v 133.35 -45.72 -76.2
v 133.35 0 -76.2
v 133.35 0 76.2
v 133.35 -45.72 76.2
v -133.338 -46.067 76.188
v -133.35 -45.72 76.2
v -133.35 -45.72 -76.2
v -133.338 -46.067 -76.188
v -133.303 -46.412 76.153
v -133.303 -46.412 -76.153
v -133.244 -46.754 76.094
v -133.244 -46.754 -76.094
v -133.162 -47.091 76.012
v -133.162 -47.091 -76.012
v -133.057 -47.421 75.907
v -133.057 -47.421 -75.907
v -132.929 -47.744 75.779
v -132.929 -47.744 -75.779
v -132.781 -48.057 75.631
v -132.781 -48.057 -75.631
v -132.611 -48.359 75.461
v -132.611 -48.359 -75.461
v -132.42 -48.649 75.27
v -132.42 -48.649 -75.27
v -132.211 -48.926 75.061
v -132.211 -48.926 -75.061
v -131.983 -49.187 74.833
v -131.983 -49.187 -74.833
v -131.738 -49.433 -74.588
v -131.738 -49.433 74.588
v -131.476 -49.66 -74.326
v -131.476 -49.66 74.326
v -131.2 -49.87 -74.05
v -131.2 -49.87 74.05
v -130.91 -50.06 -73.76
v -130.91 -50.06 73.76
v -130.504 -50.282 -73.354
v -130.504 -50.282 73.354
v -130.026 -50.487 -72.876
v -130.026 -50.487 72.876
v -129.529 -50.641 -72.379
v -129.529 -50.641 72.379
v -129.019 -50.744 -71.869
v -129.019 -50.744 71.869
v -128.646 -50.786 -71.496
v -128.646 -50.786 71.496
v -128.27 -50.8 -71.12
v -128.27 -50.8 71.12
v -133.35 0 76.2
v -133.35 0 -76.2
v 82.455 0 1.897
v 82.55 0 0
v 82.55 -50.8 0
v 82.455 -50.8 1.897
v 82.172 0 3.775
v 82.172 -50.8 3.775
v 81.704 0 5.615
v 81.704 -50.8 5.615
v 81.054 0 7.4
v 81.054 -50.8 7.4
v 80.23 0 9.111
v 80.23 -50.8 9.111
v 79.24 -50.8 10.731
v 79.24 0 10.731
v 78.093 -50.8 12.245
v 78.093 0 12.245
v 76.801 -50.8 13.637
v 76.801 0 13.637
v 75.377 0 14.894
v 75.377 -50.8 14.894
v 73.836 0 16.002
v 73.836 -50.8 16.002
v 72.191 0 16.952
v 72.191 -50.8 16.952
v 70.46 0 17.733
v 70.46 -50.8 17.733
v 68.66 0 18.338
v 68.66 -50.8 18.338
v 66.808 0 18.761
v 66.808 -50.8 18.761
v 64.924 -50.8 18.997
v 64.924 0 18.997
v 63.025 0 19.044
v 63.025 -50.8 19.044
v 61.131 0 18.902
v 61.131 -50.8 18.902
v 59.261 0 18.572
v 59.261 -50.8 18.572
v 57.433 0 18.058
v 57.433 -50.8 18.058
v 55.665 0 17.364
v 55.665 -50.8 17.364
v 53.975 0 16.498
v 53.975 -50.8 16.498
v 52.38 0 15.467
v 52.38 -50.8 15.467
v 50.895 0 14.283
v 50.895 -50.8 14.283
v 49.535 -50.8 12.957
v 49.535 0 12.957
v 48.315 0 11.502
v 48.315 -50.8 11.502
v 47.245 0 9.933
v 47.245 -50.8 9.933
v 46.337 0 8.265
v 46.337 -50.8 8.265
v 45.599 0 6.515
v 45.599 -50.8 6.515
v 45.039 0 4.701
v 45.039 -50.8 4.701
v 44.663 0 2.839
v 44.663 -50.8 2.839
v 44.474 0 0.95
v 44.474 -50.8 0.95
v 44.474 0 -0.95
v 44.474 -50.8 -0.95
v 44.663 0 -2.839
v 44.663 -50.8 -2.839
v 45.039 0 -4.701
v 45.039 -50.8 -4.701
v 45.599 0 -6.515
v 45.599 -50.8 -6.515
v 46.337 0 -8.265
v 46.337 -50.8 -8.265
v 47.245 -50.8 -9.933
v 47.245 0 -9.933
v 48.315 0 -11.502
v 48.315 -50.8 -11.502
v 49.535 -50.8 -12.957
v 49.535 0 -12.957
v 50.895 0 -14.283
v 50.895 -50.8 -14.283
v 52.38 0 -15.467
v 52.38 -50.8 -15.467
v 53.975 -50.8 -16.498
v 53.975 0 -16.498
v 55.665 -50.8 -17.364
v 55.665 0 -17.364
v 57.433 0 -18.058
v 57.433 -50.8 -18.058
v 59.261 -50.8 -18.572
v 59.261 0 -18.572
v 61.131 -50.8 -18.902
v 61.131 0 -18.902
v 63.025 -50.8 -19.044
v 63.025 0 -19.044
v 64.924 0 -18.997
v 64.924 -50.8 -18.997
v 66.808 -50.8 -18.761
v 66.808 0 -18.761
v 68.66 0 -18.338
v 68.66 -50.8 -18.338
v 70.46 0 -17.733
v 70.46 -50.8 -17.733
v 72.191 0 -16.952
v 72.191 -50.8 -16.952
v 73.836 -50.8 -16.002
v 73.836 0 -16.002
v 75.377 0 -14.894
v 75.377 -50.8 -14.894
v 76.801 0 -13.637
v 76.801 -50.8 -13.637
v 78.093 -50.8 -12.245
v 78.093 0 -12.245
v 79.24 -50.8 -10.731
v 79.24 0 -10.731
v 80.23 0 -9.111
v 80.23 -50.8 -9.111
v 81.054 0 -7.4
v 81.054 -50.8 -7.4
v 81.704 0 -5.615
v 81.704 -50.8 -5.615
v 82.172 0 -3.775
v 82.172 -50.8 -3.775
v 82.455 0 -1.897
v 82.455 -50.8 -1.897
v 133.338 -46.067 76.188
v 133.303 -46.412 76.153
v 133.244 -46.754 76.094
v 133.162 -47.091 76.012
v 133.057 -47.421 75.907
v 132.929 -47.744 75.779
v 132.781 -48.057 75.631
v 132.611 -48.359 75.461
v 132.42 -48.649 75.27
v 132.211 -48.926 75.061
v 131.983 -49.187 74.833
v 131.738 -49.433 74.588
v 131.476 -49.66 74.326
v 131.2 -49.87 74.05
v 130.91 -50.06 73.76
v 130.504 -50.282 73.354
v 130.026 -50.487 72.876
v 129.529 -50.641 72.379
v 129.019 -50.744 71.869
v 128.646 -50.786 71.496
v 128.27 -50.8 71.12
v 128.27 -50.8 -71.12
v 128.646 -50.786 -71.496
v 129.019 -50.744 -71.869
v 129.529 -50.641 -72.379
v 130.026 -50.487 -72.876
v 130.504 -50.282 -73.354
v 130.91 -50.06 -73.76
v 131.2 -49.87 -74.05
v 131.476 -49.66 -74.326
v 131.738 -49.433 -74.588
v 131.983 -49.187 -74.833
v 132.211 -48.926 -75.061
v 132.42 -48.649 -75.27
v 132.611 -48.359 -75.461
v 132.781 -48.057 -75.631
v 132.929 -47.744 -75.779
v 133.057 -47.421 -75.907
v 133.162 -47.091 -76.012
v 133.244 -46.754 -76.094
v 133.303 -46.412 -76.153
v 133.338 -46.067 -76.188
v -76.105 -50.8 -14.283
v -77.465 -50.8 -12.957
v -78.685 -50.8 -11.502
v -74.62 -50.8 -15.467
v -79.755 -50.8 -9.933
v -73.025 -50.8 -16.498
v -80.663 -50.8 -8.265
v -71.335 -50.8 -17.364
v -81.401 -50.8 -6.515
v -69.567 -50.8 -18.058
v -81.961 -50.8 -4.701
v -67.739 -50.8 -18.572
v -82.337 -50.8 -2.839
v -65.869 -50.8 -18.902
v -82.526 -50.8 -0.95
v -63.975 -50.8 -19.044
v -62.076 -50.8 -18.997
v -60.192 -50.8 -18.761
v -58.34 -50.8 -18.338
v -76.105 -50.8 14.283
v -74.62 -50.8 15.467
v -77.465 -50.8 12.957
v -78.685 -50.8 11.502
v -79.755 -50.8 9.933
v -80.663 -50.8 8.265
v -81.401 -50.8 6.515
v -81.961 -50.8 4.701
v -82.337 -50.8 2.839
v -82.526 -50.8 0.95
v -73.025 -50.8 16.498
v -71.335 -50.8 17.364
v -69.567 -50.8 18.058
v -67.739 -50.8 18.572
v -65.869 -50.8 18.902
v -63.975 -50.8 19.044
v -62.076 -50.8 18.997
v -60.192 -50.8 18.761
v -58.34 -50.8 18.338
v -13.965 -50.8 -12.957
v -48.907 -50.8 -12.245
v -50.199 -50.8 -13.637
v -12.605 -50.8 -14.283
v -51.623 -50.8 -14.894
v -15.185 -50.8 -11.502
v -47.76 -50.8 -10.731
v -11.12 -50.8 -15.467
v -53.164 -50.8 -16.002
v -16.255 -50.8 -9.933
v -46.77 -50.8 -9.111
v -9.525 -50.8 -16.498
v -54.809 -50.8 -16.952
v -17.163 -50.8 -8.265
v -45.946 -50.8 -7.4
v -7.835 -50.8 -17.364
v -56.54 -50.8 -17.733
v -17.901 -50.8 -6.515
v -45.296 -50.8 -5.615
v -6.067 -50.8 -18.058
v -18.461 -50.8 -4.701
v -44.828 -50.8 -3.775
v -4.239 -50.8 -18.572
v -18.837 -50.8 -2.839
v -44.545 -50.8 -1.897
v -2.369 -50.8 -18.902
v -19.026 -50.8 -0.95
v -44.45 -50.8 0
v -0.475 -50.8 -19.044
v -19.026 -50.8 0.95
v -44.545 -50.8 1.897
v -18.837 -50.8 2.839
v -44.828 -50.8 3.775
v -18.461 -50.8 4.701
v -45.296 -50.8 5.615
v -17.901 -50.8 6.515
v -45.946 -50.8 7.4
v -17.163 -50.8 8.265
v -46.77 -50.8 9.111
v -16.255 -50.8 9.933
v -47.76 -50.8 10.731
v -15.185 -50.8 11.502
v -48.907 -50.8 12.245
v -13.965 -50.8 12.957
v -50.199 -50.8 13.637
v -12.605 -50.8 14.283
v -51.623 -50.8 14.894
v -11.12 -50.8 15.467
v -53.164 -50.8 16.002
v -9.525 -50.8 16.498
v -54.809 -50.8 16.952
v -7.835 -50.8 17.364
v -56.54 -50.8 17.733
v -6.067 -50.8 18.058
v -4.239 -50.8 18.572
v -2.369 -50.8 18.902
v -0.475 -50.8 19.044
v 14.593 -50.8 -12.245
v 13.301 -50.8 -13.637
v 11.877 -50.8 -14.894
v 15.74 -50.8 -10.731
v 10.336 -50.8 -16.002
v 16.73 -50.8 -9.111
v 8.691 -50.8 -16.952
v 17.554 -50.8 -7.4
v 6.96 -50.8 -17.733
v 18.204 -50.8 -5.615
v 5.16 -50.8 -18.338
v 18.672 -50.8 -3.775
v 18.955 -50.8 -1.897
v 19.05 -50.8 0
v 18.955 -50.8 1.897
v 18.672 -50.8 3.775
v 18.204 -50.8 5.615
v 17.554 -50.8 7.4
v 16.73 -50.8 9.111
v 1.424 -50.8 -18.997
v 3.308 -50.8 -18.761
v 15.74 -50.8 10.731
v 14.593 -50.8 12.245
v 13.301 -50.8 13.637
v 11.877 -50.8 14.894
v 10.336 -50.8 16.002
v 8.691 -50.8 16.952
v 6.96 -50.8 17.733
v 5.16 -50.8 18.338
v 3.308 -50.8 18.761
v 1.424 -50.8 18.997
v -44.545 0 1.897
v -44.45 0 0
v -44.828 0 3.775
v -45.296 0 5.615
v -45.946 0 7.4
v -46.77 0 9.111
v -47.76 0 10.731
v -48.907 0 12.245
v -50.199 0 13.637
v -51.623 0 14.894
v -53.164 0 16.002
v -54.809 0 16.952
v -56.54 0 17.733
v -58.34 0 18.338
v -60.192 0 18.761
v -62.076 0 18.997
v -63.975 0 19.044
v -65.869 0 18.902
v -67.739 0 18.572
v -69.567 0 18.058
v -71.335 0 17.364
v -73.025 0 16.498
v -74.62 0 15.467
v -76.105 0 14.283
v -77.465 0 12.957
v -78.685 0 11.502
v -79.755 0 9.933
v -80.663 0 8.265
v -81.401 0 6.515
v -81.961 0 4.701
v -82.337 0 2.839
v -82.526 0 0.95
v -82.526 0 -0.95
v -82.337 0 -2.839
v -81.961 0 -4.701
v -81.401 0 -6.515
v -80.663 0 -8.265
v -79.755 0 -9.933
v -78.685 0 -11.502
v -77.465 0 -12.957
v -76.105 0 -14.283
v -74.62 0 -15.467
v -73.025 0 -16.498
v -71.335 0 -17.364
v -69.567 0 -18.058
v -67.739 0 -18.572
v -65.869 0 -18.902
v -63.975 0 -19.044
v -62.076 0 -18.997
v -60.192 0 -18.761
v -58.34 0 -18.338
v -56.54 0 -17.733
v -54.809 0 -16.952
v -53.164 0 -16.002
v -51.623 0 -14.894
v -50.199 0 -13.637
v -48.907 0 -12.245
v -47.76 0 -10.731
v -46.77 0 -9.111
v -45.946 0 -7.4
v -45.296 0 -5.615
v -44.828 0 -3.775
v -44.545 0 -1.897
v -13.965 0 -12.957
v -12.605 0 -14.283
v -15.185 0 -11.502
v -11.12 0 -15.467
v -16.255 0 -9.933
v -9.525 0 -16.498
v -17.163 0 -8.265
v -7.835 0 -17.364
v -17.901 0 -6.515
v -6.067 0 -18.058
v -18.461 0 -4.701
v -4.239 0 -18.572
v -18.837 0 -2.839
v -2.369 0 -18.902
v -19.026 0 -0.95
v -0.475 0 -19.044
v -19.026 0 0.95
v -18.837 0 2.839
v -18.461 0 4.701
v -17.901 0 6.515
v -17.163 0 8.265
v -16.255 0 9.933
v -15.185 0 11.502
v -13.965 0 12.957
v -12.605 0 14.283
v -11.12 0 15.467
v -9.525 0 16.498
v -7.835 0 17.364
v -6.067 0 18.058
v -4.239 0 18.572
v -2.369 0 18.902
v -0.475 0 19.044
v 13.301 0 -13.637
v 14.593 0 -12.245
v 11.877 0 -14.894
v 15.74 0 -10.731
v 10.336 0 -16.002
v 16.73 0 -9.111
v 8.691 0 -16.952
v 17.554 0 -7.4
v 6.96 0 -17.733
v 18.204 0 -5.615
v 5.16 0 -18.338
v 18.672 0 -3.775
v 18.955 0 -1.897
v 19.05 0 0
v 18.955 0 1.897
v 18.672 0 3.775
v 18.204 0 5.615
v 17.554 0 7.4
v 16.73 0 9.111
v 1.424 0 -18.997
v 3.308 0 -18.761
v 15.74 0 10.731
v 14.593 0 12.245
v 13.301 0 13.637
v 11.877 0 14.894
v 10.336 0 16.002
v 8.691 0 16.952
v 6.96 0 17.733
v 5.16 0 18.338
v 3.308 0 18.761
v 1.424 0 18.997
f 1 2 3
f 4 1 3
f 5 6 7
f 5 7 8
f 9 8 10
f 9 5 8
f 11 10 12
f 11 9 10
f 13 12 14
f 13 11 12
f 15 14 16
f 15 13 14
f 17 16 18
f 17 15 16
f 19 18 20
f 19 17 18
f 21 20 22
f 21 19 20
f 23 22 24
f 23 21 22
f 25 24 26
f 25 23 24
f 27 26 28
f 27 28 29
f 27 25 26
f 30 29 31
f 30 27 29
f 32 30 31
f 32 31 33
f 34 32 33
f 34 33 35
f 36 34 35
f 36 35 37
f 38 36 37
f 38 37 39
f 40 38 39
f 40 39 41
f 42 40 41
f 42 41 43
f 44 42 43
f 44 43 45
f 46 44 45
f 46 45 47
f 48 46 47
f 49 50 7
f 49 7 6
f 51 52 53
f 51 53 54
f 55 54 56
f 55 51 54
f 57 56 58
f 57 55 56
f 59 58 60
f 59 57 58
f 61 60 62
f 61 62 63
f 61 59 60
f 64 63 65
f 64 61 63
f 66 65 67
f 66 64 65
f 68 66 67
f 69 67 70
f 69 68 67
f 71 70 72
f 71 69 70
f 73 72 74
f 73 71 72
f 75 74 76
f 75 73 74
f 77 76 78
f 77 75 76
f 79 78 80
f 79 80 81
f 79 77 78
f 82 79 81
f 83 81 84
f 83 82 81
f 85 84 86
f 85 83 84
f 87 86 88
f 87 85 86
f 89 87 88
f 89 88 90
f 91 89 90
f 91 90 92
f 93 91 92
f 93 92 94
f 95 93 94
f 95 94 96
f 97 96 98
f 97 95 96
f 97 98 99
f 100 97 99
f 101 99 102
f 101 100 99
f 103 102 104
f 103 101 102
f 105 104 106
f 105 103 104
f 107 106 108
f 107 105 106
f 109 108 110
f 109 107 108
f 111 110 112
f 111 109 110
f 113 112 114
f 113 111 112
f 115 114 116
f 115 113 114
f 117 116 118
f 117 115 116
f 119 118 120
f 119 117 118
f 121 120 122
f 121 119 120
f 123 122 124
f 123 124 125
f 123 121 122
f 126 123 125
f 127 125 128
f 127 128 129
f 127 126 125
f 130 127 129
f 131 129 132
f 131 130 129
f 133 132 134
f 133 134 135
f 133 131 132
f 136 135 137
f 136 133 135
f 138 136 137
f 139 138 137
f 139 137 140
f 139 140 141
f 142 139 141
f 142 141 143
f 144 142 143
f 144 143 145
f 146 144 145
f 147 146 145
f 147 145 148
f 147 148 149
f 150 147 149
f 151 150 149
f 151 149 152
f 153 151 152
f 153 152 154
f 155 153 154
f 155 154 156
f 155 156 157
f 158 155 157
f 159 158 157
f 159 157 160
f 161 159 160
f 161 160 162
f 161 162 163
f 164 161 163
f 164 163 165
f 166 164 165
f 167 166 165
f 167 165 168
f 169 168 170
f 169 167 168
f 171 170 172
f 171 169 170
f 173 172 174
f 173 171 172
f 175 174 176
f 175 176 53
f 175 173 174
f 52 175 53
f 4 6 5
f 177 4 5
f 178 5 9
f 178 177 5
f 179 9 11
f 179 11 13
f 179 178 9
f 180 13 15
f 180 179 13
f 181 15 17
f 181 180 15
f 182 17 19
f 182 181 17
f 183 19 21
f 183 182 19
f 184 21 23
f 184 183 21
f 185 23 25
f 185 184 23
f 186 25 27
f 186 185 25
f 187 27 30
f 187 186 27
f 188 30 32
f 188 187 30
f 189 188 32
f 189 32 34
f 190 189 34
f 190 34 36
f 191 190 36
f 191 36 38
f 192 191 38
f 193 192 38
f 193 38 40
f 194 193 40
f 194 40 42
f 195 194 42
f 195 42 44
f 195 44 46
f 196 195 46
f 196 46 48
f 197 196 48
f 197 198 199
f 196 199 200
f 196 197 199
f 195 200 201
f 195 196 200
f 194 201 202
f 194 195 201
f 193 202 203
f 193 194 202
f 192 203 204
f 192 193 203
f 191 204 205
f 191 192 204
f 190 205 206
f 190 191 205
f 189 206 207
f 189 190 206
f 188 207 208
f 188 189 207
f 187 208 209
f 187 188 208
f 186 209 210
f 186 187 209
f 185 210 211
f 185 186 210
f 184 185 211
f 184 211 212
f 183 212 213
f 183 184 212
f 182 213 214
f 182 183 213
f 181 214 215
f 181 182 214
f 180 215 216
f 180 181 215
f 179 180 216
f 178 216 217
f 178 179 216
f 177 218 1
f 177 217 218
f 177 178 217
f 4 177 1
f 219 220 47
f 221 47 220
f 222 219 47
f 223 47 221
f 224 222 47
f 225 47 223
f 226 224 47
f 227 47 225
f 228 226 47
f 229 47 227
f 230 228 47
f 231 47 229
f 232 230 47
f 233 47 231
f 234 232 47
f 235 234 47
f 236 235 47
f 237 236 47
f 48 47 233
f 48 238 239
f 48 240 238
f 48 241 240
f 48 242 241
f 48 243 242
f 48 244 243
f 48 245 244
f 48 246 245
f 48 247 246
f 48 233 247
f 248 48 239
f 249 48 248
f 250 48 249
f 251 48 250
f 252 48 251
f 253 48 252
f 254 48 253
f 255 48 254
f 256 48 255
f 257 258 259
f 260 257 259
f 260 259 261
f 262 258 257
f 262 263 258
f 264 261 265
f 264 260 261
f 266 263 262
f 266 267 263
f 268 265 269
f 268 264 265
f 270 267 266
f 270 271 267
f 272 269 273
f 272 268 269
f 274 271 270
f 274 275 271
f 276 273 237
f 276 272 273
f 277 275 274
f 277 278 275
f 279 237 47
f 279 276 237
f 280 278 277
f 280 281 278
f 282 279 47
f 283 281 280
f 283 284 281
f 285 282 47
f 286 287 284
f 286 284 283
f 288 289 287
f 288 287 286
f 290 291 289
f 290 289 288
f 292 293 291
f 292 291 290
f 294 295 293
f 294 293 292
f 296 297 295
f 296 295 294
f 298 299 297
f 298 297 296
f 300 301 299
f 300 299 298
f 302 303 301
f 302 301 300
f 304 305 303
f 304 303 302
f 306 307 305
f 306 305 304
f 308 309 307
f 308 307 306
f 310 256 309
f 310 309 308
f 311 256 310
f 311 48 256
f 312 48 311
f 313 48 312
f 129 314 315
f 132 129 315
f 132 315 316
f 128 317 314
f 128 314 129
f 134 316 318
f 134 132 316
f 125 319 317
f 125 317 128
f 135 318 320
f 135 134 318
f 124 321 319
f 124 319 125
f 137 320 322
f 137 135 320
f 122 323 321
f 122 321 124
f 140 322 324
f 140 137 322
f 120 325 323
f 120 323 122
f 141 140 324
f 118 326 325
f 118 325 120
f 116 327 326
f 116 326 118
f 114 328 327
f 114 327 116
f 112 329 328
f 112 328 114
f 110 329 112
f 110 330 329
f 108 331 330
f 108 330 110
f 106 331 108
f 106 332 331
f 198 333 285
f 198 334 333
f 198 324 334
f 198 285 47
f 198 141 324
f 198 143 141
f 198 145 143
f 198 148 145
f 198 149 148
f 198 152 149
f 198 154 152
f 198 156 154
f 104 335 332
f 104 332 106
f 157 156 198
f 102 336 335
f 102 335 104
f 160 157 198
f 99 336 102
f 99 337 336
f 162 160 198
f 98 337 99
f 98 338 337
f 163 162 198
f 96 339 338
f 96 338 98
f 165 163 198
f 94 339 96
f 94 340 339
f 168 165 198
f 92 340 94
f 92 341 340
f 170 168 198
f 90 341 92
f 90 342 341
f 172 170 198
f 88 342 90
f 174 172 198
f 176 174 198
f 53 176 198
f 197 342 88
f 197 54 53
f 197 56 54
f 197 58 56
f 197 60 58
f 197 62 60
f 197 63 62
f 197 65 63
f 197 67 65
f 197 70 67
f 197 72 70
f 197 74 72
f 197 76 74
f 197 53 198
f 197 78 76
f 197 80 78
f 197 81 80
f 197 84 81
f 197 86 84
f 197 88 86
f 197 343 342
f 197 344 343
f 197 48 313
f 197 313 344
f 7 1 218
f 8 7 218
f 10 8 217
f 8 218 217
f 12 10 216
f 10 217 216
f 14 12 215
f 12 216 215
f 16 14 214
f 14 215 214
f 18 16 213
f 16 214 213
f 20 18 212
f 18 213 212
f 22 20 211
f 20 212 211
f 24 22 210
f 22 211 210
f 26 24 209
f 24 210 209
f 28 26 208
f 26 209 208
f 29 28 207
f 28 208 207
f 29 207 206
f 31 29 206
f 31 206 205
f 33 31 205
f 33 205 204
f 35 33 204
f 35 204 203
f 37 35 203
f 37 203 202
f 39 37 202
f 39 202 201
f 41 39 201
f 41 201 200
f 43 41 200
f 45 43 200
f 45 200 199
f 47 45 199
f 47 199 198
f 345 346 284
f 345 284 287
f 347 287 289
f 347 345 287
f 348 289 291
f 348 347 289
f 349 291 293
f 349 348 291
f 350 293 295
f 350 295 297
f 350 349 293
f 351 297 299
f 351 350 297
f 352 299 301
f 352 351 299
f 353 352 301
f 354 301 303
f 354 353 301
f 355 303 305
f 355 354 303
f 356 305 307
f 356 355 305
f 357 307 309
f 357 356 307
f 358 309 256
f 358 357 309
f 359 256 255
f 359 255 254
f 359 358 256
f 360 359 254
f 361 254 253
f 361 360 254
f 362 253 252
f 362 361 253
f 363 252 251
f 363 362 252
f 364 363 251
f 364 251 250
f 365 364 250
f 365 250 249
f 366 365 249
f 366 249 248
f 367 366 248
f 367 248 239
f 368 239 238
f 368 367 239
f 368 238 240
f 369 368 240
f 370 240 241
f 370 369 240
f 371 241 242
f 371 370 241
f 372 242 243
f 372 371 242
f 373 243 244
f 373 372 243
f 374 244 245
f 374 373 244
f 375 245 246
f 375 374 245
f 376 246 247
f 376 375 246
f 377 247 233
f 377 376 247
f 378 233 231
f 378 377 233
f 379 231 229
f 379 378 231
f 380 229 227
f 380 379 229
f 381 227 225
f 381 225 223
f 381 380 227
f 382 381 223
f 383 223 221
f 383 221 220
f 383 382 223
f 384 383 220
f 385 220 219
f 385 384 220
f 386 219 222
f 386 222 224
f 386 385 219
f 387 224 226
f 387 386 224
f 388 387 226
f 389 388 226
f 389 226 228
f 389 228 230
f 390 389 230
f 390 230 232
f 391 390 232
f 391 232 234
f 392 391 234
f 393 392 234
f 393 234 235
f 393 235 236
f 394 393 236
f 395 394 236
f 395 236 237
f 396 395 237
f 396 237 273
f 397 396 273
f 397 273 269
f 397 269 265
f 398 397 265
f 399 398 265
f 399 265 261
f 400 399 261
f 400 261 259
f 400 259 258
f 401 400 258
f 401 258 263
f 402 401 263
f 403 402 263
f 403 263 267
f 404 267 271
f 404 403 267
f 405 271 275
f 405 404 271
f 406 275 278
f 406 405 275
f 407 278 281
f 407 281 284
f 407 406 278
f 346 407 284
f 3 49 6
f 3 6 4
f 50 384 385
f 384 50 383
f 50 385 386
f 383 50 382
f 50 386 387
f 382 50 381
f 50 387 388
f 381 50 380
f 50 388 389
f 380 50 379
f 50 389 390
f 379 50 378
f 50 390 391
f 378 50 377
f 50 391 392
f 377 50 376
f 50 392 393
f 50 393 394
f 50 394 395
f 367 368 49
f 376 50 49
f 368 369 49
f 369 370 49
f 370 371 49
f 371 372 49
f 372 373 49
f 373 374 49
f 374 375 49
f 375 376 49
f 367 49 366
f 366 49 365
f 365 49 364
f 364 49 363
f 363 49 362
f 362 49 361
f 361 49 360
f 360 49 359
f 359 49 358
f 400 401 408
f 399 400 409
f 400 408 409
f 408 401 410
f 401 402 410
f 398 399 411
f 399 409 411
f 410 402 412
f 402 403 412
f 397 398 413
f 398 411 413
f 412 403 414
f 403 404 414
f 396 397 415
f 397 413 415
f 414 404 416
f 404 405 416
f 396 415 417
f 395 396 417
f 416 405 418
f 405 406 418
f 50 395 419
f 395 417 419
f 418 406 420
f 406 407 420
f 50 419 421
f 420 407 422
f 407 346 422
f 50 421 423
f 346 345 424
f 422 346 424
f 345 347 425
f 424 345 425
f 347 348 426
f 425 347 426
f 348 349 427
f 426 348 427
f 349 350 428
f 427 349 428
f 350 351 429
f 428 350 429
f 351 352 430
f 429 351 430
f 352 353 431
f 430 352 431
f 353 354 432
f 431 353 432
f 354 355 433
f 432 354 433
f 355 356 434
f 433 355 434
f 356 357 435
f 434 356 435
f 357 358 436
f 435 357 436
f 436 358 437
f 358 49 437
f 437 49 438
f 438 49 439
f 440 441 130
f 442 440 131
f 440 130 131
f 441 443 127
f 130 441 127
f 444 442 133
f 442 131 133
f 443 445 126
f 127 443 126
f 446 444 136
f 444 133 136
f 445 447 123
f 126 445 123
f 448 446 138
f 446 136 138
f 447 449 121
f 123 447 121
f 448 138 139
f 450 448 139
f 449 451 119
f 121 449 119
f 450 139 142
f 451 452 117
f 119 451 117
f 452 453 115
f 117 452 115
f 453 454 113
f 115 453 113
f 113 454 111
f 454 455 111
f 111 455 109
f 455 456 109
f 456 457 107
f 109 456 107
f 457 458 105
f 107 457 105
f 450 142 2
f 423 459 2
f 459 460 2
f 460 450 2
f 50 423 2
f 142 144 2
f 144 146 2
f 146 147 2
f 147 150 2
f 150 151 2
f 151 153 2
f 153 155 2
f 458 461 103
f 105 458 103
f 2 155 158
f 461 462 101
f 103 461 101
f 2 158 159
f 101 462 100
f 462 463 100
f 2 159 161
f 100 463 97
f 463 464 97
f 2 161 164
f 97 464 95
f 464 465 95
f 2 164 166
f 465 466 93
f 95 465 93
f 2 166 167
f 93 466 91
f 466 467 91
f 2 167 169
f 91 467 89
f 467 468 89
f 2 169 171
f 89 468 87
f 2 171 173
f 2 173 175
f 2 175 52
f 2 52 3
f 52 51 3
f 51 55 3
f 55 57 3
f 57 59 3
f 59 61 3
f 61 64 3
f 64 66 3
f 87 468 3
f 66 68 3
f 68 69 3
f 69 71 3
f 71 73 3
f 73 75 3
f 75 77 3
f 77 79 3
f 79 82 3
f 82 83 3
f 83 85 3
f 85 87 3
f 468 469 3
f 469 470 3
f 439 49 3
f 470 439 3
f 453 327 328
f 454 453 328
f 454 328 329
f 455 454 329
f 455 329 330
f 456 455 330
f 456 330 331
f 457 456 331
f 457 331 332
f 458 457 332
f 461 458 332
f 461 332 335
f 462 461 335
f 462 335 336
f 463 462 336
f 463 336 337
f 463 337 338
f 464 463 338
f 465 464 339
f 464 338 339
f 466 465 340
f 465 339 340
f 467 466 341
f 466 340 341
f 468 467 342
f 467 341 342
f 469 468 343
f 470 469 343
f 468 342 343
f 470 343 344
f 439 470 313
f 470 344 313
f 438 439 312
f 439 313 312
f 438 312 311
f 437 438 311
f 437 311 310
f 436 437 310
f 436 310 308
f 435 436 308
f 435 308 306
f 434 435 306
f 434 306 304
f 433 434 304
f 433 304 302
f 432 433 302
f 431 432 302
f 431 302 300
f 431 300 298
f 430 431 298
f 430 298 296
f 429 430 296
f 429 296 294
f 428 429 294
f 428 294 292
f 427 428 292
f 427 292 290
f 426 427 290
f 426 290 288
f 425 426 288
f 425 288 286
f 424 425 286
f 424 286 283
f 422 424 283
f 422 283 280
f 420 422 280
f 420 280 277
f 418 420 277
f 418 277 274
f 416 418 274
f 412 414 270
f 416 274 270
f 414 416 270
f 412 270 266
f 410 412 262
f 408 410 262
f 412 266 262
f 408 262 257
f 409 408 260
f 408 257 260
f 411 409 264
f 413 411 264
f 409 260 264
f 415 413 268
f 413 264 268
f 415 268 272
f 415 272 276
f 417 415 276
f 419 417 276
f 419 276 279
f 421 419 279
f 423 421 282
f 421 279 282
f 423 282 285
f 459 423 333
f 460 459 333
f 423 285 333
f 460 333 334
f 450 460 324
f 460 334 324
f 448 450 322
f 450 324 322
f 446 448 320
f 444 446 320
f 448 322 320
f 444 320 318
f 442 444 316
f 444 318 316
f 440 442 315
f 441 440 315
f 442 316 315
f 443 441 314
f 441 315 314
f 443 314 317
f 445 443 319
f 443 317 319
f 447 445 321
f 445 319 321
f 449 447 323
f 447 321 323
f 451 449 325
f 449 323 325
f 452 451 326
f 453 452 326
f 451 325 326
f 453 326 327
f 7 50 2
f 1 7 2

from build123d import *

# Parameters (mm, degrees)
F0_W     = 266.7
F0_H     = 152.4
F1_DEPTH = 50.8
F2_R     = 19.05
F3_DEPTH = 76.2
F4_R     = 19.05
F5_DEPTH = 50.8
F6_R     = 19.05
F7_DEPTH = 50.8
F8_R     = 5.08


with BuildPart() as f1:
    # F0 (on Front) → F1 (new body)
    with BuildSketch(Plane.XZ):
        Rectangle(F0_W, F0_H)
    extrude(amount=F1_DEPTH)

    # F2 (on face) → F3 (cut)
    with BuildSketch(Plane.XZ.offset(50.8)):
        Circle(F2_R)
    extrude(amount=-F3_DEPTH, mode=Mode.SUBTRACT)

    # F4 (on Front) → F5 (cut)
    with BuildSketch(Plane.XZ):
        with Locations((-63.5, 0)):
            Circle(F4_R)
    extrude(amount=F5_DEPTH, mode=Mode.SUBTRACT)

    # F6 (on Front) → F7 (cut)
    with BuildSketch(Plane.XZ):
        with Locations((63.5, 0)):
            Circle(F6_R)
    extrude(amount=F7_DEPTH, mode=Mode.SUBTRACT)

    # F8
    f8_edges = [f1.edges().sort_by_distance(p)[0] for p in [
        (0, -50.8, 76.2),
        (-133.35, -50.8, 0),
        (0, -50.8, -76.2),
        (133.35, -50.8, 0),
    ]]
    fillet(f8_edges, radius=F8_R)


solid = f1.part
